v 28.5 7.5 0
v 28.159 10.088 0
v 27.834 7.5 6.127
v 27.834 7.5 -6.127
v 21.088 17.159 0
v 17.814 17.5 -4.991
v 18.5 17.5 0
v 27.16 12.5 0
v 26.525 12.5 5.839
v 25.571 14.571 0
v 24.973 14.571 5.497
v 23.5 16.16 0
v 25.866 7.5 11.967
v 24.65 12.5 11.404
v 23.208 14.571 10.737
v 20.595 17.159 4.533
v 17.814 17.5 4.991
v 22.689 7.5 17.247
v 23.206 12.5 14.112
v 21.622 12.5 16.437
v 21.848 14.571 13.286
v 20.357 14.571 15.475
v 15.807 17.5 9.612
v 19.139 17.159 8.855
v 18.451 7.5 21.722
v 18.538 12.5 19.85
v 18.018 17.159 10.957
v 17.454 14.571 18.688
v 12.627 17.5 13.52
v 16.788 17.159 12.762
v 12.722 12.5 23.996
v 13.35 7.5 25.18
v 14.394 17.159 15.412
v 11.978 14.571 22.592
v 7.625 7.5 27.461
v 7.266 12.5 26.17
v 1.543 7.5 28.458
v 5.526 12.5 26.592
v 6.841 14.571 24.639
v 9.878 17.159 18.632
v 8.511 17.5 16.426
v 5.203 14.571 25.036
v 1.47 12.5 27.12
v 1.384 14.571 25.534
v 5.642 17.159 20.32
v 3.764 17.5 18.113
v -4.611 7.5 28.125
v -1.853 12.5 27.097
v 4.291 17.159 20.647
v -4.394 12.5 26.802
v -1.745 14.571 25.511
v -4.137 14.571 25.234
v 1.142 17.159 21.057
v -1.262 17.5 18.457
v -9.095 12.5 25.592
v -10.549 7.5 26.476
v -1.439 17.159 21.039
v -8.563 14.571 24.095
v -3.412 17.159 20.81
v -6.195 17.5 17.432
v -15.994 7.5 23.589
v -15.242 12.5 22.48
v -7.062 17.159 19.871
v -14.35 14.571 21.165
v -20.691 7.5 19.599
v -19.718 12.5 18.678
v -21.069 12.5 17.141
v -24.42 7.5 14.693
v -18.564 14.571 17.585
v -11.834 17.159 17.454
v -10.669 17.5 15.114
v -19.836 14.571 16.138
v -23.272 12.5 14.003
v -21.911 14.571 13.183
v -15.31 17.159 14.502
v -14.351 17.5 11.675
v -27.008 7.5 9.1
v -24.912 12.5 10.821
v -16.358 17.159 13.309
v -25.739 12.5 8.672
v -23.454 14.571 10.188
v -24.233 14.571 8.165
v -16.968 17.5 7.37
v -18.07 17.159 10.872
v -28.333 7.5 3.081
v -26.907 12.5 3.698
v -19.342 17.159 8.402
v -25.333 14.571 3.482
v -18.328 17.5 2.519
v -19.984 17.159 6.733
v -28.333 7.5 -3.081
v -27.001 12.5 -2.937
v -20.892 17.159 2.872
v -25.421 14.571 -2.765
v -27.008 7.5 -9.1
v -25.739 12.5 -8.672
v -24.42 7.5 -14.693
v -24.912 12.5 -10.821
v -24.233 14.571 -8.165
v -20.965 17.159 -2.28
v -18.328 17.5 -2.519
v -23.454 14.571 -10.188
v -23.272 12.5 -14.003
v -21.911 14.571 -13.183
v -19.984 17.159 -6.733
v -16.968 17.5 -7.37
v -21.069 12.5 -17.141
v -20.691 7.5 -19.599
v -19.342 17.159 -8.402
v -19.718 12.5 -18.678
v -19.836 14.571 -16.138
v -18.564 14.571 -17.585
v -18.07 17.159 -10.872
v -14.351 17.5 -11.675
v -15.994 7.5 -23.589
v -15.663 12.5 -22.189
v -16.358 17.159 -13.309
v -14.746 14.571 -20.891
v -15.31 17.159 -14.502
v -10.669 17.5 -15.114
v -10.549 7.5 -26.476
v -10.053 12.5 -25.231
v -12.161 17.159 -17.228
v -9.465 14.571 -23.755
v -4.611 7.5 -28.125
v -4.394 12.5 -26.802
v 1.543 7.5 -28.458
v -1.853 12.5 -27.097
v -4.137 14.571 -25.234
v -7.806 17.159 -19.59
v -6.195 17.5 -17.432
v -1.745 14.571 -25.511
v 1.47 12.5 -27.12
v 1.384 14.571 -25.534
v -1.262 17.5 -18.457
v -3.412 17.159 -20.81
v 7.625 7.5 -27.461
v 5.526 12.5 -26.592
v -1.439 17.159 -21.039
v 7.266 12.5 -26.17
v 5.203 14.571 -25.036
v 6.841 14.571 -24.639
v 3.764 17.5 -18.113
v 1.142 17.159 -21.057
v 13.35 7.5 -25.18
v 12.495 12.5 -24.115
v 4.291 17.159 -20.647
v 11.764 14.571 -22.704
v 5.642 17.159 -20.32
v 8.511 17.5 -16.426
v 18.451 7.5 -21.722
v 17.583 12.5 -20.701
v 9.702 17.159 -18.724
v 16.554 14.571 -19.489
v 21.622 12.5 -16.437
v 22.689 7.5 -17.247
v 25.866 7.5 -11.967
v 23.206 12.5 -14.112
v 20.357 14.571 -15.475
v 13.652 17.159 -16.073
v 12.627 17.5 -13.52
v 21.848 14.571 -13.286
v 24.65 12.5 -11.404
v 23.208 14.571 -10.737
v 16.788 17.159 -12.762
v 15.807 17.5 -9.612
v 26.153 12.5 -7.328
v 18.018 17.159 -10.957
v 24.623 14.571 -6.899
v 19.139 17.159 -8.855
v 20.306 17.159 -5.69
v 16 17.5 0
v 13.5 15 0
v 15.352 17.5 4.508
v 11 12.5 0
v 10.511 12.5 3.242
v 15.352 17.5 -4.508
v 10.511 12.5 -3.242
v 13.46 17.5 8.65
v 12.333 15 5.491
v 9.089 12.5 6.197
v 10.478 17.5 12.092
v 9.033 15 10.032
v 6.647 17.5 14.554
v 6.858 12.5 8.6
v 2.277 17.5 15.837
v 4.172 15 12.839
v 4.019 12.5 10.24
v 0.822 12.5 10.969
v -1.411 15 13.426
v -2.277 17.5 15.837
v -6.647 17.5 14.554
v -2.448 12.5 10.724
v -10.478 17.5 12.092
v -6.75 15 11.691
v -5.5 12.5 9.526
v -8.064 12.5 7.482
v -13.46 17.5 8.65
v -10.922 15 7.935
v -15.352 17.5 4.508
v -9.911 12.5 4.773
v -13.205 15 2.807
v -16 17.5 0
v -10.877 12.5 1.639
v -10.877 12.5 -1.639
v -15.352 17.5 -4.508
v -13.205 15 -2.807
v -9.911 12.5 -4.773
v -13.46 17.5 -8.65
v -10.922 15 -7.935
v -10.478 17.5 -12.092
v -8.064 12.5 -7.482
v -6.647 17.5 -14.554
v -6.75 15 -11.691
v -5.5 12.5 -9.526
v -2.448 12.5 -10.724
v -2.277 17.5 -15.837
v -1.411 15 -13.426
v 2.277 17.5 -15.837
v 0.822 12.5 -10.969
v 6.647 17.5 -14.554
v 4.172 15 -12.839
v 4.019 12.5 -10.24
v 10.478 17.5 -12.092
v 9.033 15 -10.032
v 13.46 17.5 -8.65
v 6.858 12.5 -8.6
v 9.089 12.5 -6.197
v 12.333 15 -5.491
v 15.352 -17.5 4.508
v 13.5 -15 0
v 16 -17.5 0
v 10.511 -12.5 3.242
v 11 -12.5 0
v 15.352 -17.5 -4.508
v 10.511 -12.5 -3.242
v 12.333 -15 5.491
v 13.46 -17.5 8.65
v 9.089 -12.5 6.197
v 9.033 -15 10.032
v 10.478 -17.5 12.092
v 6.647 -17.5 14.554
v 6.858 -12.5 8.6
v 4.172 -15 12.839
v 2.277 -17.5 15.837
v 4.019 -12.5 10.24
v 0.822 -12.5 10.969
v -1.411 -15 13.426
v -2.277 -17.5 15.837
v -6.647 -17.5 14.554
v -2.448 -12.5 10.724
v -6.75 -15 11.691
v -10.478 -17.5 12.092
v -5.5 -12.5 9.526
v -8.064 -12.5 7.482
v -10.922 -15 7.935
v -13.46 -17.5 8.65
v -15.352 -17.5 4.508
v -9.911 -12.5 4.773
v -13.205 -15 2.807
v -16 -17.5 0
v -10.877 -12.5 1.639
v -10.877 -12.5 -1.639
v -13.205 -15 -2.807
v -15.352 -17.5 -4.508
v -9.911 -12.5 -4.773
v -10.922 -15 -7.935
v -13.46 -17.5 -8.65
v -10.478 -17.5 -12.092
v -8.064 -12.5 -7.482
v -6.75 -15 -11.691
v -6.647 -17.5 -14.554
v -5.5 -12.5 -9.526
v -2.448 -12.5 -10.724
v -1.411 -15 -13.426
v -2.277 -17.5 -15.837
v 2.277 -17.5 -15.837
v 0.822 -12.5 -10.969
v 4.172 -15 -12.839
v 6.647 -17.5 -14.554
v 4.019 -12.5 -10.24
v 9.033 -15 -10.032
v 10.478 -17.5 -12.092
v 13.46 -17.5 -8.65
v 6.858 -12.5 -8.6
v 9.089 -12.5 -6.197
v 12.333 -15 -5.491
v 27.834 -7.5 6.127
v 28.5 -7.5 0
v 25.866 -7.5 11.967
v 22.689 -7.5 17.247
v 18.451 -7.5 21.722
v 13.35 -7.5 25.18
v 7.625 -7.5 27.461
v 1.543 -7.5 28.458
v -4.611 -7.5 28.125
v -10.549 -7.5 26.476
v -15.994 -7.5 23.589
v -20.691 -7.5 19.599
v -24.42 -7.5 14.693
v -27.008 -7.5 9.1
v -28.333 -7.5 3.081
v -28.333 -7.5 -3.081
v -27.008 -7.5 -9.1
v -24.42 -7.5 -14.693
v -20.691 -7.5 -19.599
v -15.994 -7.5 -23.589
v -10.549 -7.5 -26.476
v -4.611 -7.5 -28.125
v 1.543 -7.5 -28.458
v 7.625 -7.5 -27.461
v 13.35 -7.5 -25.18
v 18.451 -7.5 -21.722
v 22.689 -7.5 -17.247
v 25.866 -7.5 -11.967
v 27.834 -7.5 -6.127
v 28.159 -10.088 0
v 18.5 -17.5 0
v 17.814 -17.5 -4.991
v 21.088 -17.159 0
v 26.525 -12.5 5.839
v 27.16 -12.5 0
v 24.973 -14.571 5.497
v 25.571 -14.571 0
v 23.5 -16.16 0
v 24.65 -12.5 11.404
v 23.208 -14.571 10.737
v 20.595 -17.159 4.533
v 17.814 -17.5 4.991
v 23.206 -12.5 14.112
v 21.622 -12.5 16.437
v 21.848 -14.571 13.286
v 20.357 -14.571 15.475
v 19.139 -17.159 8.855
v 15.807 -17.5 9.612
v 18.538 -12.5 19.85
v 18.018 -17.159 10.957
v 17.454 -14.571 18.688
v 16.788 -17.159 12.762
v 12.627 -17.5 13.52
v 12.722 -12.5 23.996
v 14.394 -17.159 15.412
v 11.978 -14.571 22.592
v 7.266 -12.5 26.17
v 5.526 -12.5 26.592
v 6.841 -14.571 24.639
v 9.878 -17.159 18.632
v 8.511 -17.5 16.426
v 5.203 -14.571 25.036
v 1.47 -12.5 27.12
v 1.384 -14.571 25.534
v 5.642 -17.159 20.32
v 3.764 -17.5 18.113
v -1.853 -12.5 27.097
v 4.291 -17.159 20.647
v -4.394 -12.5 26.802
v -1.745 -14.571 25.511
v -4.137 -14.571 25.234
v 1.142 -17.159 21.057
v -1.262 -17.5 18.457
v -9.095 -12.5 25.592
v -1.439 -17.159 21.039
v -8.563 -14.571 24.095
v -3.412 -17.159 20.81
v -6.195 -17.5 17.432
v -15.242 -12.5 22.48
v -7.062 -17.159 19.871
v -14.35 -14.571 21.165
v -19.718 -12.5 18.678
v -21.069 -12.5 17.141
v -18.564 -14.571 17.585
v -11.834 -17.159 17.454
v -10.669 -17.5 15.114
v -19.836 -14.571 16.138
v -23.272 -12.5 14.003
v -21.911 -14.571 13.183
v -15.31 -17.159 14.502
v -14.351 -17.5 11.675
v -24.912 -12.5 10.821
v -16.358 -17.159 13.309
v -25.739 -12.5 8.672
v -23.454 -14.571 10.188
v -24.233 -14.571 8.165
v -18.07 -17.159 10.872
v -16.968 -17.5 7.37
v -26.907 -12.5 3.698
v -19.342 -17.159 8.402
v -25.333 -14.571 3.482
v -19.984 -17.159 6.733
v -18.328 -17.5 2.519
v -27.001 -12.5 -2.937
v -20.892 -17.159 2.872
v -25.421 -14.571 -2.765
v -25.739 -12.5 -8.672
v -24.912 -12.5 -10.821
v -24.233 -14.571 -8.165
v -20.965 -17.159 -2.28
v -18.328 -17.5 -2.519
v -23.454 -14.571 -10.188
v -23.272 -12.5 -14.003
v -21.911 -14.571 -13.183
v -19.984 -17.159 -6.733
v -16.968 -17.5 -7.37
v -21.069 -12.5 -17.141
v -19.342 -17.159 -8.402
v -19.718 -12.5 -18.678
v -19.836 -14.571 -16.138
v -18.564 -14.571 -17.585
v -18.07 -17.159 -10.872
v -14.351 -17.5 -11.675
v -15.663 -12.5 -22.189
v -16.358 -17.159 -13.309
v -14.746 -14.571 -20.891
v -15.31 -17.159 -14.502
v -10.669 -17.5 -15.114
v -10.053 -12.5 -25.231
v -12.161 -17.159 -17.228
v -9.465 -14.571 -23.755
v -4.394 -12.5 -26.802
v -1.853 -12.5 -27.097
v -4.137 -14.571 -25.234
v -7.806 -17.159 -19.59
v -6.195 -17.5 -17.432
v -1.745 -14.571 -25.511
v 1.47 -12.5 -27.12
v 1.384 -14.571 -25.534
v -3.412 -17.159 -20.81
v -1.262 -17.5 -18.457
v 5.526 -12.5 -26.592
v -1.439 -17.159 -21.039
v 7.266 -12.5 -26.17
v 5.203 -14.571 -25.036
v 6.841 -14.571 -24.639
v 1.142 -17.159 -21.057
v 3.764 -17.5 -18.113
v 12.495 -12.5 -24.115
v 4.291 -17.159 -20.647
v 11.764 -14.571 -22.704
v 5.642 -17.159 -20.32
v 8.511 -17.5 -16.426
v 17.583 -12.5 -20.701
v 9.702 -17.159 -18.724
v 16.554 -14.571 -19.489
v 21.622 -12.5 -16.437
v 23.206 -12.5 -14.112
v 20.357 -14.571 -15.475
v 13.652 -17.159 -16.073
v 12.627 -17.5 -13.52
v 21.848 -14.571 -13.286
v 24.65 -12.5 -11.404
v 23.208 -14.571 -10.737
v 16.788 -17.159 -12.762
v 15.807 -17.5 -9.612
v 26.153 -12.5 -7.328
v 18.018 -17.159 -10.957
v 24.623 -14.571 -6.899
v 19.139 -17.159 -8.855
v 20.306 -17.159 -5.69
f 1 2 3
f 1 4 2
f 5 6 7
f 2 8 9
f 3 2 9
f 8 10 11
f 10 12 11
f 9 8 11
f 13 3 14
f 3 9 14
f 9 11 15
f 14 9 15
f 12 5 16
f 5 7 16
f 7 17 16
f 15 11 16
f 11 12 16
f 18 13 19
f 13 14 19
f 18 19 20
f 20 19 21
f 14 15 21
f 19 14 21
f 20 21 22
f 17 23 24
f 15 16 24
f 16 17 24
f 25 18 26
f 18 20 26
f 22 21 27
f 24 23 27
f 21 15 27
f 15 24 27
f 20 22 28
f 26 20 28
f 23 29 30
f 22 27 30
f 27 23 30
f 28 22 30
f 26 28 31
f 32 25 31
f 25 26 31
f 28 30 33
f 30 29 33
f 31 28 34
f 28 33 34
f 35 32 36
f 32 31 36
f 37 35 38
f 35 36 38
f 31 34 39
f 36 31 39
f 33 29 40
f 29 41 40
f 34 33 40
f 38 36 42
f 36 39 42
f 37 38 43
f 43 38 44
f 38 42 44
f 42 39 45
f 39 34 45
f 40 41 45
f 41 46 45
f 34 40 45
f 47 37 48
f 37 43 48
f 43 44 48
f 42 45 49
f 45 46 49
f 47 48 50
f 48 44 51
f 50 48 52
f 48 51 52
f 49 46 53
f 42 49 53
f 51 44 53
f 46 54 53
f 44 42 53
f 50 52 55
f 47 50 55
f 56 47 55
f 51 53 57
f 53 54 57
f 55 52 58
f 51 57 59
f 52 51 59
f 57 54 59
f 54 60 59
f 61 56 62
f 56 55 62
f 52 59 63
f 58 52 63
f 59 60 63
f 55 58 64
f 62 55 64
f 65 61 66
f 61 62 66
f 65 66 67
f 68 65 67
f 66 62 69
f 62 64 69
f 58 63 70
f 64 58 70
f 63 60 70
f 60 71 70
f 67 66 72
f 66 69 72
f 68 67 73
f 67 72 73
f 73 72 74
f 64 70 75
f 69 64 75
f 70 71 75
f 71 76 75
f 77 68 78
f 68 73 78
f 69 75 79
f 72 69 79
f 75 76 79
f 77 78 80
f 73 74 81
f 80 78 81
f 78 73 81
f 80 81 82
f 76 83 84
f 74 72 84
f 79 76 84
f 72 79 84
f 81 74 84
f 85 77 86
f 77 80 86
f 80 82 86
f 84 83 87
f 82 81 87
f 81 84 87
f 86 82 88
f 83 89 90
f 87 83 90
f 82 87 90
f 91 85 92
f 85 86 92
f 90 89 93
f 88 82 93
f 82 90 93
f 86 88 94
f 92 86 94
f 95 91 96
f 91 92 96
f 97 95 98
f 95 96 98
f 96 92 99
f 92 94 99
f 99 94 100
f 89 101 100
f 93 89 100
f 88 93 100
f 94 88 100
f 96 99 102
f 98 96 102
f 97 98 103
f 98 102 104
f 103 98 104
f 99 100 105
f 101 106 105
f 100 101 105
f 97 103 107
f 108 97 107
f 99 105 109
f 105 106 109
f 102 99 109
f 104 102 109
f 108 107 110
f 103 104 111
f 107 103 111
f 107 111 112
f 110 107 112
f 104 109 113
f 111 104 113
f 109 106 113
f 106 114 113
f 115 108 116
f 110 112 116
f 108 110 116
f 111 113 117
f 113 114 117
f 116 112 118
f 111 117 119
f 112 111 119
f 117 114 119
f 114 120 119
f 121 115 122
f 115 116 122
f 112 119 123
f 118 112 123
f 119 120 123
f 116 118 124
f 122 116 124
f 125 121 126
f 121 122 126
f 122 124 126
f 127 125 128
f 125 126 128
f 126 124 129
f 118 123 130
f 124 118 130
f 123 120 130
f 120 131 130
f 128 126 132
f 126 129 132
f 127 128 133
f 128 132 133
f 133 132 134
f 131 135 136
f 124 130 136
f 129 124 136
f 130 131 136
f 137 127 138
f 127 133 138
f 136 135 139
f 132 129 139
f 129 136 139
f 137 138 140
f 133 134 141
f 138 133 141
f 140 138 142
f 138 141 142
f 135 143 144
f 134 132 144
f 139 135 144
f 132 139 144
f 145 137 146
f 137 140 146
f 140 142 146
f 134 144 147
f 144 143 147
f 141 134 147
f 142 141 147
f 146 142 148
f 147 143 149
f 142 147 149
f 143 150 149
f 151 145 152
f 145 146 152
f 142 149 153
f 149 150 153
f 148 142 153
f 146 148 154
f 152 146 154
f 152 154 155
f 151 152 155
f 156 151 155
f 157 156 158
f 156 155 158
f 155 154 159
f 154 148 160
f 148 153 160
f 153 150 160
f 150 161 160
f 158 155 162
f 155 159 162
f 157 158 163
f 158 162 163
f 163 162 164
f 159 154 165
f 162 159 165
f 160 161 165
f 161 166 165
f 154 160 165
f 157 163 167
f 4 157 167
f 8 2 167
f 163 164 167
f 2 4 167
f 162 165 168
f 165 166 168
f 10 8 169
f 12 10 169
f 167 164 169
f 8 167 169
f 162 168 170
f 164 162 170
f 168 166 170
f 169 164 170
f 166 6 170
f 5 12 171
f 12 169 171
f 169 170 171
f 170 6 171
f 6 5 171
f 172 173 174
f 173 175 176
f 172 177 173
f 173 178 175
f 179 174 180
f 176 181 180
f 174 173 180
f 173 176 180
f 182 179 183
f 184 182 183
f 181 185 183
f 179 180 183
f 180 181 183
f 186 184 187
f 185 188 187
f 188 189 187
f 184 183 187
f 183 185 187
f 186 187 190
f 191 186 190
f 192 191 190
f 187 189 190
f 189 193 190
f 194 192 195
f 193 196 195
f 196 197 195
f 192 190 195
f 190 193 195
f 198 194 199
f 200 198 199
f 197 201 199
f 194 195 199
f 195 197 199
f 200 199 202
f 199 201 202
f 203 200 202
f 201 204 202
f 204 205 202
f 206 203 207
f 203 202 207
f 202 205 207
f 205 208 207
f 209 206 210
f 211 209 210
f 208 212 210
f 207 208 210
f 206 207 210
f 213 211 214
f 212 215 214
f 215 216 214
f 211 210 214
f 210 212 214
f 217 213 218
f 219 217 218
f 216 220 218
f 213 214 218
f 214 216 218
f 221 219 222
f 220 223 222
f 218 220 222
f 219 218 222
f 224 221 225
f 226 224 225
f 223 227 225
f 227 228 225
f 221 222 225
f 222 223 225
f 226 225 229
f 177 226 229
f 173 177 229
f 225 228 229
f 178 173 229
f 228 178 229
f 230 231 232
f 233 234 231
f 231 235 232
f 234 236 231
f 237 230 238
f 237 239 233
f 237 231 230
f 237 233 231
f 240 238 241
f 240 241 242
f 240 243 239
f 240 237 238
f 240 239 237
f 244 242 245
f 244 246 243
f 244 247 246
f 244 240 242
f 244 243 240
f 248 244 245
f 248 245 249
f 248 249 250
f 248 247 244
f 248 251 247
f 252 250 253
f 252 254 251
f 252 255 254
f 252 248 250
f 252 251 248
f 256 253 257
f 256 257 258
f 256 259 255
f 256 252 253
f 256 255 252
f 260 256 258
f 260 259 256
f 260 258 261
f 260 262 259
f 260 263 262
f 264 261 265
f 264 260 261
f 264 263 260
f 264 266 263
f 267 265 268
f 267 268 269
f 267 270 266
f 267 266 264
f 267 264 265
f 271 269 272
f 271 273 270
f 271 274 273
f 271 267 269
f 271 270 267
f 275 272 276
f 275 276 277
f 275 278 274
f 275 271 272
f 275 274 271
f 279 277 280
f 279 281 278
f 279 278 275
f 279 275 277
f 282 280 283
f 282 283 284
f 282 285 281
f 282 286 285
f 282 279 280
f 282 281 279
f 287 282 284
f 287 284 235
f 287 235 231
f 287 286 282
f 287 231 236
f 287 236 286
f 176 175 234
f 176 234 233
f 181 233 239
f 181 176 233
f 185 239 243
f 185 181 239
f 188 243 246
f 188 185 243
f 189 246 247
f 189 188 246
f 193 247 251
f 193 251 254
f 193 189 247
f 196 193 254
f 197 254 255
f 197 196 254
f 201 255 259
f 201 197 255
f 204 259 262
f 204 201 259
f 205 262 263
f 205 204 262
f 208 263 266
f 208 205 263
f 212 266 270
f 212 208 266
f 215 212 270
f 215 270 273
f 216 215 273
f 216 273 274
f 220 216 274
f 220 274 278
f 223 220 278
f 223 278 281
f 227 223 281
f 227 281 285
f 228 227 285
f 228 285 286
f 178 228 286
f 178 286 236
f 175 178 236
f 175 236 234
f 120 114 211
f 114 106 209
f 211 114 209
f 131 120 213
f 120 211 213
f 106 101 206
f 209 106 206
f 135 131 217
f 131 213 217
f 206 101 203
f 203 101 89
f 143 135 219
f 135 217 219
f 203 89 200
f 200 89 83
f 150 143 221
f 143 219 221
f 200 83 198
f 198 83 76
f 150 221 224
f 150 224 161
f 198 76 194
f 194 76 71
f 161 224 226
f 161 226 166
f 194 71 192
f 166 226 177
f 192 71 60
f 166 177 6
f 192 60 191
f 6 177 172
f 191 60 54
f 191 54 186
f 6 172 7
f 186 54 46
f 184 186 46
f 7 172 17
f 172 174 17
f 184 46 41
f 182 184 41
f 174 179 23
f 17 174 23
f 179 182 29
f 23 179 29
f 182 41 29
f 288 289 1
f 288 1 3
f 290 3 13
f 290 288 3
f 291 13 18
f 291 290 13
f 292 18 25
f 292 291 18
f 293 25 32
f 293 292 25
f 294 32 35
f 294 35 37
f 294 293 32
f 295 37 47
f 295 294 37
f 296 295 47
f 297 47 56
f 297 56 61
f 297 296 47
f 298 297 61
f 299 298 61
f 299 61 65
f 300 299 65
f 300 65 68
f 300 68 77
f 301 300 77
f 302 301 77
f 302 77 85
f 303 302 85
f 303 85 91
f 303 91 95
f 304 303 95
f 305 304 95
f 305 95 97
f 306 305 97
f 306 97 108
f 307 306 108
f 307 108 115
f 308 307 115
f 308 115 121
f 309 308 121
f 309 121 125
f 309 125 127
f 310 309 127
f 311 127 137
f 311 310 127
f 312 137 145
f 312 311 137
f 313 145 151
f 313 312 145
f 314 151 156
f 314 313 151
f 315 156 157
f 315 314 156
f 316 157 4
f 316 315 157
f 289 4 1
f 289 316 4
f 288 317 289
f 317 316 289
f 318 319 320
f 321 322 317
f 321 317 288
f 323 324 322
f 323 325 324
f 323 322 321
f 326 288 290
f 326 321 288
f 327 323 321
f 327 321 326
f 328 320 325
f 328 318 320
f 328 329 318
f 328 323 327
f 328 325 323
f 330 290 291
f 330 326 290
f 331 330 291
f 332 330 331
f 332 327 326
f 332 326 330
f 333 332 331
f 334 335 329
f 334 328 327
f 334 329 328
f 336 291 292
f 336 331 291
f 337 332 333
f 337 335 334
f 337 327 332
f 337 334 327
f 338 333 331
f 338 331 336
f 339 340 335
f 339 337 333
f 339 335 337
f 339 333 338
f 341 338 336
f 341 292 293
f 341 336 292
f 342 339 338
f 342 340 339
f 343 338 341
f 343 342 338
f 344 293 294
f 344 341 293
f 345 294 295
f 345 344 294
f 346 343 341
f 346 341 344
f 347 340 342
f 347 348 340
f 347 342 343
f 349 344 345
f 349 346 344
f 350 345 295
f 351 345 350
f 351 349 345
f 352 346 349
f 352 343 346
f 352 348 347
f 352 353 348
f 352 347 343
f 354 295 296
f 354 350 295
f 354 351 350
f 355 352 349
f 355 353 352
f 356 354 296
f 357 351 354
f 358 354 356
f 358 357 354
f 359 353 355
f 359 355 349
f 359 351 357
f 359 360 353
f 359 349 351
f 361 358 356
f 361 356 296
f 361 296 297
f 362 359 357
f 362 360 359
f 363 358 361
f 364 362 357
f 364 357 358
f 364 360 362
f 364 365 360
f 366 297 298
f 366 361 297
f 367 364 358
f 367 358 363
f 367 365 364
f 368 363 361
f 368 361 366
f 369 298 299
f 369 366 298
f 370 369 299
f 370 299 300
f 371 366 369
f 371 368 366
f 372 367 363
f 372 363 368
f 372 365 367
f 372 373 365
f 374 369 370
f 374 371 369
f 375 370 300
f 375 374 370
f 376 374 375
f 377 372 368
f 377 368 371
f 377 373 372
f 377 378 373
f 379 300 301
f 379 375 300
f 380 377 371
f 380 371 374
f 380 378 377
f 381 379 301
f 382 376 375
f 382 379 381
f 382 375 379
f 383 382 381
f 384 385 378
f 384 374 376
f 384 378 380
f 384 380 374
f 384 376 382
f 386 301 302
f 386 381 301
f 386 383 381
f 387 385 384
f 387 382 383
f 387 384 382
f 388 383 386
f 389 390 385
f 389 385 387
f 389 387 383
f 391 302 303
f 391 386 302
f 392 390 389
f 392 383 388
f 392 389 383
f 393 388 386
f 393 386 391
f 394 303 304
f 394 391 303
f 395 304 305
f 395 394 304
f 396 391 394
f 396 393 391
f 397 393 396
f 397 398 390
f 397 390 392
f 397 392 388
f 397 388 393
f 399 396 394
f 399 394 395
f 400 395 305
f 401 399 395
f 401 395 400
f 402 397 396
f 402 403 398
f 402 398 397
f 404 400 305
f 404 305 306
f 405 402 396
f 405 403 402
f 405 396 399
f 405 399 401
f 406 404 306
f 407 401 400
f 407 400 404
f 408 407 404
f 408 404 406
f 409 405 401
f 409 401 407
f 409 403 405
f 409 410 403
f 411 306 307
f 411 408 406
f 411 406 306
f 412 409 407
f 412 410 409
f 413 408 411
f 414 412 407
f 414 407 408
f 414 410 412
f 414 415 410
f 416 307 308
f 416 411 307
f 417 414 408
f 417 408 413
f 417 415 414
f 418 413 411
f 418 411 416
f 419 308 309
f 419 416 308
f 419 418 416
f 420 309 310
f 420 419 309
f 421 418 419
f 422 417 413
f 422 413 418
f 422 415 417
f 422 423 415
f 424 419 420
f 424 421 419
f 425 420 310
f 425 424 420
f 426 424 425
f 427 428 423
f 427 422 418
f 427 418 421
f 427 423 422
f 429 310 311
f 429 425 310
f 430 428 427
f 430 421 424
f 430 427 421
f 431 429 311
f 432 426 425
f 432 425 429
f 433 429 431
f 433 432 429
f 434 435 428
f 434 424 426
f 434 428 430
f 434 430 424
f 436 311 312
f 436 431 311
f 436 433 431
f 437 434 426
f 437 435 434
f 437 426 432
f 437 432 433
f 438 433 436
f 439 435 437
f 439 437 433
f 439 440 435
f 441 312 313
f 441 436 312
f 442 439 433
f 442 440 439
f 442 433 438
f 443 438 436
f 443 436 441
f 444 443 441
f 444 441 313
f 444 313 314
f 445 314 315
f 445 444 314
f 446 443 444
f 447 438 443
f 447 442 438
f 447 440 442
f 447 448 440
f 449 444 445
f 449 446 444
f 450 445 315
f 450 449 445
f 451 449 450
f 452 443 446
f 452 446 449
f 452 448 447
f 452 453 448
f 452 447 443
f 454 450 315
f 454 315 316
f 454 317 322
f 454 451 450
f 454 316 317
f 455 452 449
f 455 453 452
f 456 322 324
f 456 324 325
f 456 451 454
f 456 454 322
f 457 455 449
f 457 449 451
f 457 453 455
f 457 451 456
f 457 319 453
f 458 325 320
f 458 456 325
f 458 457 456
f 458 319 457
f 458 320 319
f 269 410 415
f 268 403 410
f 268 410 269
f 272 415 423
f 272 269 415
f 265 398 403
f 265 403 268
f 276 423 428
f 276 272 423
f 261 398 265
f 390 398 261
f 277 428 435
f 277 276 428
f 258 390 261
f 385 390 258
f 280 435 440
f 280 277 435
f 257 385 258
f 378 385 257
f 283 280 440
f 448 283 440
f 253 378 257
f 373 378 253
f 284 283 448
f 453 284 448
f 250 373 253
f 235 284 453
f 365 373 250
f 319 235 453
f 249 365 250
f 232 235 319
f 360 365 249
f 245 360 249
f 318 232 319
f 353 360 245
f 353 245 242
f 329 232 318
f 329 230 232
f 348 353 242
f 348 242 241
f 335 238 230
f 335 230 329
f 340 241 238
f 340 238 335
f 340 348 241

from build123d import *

# Parameters (mm, degrees)
F0_R     = 28.5
F0_R_2   = 11
F1_DEPTH = 17.5
F2_R     = 10
F3_SIZE  = 5


with BuildPart() as f1:
    # F0 (on Front) → F1 (new body, symmetric)
    with BuildSketch(Plane.XZ):
        Circle(F0_R)
        Circle(F0_R_2, mode=Mode.SUBTRACT)
    extrude(amount=F1_DEPTH, both=True)

    # F2
    f2_edges = [f1.edges().sort_by_distance(p)[0] for p in [
        (-28.5, -17.5, 0),
        (-28.5, 17.5, 0),
    ]]
    fillet(f2_edges, radius=F2_R)

    # F3
    f3_edges = [f1.edges().sort_by_distance(p)[0] for p in [
        (28.5, 0, 0),
        (-28.5, 7.5, 0),
        (-28.5, -7.5, 0),
        (-11, -17.5, 0),
        (-11, 17.5, 0),
    ]]
    chamfer(f3_edges, length=F3_SIZE)


solid = f1.part
